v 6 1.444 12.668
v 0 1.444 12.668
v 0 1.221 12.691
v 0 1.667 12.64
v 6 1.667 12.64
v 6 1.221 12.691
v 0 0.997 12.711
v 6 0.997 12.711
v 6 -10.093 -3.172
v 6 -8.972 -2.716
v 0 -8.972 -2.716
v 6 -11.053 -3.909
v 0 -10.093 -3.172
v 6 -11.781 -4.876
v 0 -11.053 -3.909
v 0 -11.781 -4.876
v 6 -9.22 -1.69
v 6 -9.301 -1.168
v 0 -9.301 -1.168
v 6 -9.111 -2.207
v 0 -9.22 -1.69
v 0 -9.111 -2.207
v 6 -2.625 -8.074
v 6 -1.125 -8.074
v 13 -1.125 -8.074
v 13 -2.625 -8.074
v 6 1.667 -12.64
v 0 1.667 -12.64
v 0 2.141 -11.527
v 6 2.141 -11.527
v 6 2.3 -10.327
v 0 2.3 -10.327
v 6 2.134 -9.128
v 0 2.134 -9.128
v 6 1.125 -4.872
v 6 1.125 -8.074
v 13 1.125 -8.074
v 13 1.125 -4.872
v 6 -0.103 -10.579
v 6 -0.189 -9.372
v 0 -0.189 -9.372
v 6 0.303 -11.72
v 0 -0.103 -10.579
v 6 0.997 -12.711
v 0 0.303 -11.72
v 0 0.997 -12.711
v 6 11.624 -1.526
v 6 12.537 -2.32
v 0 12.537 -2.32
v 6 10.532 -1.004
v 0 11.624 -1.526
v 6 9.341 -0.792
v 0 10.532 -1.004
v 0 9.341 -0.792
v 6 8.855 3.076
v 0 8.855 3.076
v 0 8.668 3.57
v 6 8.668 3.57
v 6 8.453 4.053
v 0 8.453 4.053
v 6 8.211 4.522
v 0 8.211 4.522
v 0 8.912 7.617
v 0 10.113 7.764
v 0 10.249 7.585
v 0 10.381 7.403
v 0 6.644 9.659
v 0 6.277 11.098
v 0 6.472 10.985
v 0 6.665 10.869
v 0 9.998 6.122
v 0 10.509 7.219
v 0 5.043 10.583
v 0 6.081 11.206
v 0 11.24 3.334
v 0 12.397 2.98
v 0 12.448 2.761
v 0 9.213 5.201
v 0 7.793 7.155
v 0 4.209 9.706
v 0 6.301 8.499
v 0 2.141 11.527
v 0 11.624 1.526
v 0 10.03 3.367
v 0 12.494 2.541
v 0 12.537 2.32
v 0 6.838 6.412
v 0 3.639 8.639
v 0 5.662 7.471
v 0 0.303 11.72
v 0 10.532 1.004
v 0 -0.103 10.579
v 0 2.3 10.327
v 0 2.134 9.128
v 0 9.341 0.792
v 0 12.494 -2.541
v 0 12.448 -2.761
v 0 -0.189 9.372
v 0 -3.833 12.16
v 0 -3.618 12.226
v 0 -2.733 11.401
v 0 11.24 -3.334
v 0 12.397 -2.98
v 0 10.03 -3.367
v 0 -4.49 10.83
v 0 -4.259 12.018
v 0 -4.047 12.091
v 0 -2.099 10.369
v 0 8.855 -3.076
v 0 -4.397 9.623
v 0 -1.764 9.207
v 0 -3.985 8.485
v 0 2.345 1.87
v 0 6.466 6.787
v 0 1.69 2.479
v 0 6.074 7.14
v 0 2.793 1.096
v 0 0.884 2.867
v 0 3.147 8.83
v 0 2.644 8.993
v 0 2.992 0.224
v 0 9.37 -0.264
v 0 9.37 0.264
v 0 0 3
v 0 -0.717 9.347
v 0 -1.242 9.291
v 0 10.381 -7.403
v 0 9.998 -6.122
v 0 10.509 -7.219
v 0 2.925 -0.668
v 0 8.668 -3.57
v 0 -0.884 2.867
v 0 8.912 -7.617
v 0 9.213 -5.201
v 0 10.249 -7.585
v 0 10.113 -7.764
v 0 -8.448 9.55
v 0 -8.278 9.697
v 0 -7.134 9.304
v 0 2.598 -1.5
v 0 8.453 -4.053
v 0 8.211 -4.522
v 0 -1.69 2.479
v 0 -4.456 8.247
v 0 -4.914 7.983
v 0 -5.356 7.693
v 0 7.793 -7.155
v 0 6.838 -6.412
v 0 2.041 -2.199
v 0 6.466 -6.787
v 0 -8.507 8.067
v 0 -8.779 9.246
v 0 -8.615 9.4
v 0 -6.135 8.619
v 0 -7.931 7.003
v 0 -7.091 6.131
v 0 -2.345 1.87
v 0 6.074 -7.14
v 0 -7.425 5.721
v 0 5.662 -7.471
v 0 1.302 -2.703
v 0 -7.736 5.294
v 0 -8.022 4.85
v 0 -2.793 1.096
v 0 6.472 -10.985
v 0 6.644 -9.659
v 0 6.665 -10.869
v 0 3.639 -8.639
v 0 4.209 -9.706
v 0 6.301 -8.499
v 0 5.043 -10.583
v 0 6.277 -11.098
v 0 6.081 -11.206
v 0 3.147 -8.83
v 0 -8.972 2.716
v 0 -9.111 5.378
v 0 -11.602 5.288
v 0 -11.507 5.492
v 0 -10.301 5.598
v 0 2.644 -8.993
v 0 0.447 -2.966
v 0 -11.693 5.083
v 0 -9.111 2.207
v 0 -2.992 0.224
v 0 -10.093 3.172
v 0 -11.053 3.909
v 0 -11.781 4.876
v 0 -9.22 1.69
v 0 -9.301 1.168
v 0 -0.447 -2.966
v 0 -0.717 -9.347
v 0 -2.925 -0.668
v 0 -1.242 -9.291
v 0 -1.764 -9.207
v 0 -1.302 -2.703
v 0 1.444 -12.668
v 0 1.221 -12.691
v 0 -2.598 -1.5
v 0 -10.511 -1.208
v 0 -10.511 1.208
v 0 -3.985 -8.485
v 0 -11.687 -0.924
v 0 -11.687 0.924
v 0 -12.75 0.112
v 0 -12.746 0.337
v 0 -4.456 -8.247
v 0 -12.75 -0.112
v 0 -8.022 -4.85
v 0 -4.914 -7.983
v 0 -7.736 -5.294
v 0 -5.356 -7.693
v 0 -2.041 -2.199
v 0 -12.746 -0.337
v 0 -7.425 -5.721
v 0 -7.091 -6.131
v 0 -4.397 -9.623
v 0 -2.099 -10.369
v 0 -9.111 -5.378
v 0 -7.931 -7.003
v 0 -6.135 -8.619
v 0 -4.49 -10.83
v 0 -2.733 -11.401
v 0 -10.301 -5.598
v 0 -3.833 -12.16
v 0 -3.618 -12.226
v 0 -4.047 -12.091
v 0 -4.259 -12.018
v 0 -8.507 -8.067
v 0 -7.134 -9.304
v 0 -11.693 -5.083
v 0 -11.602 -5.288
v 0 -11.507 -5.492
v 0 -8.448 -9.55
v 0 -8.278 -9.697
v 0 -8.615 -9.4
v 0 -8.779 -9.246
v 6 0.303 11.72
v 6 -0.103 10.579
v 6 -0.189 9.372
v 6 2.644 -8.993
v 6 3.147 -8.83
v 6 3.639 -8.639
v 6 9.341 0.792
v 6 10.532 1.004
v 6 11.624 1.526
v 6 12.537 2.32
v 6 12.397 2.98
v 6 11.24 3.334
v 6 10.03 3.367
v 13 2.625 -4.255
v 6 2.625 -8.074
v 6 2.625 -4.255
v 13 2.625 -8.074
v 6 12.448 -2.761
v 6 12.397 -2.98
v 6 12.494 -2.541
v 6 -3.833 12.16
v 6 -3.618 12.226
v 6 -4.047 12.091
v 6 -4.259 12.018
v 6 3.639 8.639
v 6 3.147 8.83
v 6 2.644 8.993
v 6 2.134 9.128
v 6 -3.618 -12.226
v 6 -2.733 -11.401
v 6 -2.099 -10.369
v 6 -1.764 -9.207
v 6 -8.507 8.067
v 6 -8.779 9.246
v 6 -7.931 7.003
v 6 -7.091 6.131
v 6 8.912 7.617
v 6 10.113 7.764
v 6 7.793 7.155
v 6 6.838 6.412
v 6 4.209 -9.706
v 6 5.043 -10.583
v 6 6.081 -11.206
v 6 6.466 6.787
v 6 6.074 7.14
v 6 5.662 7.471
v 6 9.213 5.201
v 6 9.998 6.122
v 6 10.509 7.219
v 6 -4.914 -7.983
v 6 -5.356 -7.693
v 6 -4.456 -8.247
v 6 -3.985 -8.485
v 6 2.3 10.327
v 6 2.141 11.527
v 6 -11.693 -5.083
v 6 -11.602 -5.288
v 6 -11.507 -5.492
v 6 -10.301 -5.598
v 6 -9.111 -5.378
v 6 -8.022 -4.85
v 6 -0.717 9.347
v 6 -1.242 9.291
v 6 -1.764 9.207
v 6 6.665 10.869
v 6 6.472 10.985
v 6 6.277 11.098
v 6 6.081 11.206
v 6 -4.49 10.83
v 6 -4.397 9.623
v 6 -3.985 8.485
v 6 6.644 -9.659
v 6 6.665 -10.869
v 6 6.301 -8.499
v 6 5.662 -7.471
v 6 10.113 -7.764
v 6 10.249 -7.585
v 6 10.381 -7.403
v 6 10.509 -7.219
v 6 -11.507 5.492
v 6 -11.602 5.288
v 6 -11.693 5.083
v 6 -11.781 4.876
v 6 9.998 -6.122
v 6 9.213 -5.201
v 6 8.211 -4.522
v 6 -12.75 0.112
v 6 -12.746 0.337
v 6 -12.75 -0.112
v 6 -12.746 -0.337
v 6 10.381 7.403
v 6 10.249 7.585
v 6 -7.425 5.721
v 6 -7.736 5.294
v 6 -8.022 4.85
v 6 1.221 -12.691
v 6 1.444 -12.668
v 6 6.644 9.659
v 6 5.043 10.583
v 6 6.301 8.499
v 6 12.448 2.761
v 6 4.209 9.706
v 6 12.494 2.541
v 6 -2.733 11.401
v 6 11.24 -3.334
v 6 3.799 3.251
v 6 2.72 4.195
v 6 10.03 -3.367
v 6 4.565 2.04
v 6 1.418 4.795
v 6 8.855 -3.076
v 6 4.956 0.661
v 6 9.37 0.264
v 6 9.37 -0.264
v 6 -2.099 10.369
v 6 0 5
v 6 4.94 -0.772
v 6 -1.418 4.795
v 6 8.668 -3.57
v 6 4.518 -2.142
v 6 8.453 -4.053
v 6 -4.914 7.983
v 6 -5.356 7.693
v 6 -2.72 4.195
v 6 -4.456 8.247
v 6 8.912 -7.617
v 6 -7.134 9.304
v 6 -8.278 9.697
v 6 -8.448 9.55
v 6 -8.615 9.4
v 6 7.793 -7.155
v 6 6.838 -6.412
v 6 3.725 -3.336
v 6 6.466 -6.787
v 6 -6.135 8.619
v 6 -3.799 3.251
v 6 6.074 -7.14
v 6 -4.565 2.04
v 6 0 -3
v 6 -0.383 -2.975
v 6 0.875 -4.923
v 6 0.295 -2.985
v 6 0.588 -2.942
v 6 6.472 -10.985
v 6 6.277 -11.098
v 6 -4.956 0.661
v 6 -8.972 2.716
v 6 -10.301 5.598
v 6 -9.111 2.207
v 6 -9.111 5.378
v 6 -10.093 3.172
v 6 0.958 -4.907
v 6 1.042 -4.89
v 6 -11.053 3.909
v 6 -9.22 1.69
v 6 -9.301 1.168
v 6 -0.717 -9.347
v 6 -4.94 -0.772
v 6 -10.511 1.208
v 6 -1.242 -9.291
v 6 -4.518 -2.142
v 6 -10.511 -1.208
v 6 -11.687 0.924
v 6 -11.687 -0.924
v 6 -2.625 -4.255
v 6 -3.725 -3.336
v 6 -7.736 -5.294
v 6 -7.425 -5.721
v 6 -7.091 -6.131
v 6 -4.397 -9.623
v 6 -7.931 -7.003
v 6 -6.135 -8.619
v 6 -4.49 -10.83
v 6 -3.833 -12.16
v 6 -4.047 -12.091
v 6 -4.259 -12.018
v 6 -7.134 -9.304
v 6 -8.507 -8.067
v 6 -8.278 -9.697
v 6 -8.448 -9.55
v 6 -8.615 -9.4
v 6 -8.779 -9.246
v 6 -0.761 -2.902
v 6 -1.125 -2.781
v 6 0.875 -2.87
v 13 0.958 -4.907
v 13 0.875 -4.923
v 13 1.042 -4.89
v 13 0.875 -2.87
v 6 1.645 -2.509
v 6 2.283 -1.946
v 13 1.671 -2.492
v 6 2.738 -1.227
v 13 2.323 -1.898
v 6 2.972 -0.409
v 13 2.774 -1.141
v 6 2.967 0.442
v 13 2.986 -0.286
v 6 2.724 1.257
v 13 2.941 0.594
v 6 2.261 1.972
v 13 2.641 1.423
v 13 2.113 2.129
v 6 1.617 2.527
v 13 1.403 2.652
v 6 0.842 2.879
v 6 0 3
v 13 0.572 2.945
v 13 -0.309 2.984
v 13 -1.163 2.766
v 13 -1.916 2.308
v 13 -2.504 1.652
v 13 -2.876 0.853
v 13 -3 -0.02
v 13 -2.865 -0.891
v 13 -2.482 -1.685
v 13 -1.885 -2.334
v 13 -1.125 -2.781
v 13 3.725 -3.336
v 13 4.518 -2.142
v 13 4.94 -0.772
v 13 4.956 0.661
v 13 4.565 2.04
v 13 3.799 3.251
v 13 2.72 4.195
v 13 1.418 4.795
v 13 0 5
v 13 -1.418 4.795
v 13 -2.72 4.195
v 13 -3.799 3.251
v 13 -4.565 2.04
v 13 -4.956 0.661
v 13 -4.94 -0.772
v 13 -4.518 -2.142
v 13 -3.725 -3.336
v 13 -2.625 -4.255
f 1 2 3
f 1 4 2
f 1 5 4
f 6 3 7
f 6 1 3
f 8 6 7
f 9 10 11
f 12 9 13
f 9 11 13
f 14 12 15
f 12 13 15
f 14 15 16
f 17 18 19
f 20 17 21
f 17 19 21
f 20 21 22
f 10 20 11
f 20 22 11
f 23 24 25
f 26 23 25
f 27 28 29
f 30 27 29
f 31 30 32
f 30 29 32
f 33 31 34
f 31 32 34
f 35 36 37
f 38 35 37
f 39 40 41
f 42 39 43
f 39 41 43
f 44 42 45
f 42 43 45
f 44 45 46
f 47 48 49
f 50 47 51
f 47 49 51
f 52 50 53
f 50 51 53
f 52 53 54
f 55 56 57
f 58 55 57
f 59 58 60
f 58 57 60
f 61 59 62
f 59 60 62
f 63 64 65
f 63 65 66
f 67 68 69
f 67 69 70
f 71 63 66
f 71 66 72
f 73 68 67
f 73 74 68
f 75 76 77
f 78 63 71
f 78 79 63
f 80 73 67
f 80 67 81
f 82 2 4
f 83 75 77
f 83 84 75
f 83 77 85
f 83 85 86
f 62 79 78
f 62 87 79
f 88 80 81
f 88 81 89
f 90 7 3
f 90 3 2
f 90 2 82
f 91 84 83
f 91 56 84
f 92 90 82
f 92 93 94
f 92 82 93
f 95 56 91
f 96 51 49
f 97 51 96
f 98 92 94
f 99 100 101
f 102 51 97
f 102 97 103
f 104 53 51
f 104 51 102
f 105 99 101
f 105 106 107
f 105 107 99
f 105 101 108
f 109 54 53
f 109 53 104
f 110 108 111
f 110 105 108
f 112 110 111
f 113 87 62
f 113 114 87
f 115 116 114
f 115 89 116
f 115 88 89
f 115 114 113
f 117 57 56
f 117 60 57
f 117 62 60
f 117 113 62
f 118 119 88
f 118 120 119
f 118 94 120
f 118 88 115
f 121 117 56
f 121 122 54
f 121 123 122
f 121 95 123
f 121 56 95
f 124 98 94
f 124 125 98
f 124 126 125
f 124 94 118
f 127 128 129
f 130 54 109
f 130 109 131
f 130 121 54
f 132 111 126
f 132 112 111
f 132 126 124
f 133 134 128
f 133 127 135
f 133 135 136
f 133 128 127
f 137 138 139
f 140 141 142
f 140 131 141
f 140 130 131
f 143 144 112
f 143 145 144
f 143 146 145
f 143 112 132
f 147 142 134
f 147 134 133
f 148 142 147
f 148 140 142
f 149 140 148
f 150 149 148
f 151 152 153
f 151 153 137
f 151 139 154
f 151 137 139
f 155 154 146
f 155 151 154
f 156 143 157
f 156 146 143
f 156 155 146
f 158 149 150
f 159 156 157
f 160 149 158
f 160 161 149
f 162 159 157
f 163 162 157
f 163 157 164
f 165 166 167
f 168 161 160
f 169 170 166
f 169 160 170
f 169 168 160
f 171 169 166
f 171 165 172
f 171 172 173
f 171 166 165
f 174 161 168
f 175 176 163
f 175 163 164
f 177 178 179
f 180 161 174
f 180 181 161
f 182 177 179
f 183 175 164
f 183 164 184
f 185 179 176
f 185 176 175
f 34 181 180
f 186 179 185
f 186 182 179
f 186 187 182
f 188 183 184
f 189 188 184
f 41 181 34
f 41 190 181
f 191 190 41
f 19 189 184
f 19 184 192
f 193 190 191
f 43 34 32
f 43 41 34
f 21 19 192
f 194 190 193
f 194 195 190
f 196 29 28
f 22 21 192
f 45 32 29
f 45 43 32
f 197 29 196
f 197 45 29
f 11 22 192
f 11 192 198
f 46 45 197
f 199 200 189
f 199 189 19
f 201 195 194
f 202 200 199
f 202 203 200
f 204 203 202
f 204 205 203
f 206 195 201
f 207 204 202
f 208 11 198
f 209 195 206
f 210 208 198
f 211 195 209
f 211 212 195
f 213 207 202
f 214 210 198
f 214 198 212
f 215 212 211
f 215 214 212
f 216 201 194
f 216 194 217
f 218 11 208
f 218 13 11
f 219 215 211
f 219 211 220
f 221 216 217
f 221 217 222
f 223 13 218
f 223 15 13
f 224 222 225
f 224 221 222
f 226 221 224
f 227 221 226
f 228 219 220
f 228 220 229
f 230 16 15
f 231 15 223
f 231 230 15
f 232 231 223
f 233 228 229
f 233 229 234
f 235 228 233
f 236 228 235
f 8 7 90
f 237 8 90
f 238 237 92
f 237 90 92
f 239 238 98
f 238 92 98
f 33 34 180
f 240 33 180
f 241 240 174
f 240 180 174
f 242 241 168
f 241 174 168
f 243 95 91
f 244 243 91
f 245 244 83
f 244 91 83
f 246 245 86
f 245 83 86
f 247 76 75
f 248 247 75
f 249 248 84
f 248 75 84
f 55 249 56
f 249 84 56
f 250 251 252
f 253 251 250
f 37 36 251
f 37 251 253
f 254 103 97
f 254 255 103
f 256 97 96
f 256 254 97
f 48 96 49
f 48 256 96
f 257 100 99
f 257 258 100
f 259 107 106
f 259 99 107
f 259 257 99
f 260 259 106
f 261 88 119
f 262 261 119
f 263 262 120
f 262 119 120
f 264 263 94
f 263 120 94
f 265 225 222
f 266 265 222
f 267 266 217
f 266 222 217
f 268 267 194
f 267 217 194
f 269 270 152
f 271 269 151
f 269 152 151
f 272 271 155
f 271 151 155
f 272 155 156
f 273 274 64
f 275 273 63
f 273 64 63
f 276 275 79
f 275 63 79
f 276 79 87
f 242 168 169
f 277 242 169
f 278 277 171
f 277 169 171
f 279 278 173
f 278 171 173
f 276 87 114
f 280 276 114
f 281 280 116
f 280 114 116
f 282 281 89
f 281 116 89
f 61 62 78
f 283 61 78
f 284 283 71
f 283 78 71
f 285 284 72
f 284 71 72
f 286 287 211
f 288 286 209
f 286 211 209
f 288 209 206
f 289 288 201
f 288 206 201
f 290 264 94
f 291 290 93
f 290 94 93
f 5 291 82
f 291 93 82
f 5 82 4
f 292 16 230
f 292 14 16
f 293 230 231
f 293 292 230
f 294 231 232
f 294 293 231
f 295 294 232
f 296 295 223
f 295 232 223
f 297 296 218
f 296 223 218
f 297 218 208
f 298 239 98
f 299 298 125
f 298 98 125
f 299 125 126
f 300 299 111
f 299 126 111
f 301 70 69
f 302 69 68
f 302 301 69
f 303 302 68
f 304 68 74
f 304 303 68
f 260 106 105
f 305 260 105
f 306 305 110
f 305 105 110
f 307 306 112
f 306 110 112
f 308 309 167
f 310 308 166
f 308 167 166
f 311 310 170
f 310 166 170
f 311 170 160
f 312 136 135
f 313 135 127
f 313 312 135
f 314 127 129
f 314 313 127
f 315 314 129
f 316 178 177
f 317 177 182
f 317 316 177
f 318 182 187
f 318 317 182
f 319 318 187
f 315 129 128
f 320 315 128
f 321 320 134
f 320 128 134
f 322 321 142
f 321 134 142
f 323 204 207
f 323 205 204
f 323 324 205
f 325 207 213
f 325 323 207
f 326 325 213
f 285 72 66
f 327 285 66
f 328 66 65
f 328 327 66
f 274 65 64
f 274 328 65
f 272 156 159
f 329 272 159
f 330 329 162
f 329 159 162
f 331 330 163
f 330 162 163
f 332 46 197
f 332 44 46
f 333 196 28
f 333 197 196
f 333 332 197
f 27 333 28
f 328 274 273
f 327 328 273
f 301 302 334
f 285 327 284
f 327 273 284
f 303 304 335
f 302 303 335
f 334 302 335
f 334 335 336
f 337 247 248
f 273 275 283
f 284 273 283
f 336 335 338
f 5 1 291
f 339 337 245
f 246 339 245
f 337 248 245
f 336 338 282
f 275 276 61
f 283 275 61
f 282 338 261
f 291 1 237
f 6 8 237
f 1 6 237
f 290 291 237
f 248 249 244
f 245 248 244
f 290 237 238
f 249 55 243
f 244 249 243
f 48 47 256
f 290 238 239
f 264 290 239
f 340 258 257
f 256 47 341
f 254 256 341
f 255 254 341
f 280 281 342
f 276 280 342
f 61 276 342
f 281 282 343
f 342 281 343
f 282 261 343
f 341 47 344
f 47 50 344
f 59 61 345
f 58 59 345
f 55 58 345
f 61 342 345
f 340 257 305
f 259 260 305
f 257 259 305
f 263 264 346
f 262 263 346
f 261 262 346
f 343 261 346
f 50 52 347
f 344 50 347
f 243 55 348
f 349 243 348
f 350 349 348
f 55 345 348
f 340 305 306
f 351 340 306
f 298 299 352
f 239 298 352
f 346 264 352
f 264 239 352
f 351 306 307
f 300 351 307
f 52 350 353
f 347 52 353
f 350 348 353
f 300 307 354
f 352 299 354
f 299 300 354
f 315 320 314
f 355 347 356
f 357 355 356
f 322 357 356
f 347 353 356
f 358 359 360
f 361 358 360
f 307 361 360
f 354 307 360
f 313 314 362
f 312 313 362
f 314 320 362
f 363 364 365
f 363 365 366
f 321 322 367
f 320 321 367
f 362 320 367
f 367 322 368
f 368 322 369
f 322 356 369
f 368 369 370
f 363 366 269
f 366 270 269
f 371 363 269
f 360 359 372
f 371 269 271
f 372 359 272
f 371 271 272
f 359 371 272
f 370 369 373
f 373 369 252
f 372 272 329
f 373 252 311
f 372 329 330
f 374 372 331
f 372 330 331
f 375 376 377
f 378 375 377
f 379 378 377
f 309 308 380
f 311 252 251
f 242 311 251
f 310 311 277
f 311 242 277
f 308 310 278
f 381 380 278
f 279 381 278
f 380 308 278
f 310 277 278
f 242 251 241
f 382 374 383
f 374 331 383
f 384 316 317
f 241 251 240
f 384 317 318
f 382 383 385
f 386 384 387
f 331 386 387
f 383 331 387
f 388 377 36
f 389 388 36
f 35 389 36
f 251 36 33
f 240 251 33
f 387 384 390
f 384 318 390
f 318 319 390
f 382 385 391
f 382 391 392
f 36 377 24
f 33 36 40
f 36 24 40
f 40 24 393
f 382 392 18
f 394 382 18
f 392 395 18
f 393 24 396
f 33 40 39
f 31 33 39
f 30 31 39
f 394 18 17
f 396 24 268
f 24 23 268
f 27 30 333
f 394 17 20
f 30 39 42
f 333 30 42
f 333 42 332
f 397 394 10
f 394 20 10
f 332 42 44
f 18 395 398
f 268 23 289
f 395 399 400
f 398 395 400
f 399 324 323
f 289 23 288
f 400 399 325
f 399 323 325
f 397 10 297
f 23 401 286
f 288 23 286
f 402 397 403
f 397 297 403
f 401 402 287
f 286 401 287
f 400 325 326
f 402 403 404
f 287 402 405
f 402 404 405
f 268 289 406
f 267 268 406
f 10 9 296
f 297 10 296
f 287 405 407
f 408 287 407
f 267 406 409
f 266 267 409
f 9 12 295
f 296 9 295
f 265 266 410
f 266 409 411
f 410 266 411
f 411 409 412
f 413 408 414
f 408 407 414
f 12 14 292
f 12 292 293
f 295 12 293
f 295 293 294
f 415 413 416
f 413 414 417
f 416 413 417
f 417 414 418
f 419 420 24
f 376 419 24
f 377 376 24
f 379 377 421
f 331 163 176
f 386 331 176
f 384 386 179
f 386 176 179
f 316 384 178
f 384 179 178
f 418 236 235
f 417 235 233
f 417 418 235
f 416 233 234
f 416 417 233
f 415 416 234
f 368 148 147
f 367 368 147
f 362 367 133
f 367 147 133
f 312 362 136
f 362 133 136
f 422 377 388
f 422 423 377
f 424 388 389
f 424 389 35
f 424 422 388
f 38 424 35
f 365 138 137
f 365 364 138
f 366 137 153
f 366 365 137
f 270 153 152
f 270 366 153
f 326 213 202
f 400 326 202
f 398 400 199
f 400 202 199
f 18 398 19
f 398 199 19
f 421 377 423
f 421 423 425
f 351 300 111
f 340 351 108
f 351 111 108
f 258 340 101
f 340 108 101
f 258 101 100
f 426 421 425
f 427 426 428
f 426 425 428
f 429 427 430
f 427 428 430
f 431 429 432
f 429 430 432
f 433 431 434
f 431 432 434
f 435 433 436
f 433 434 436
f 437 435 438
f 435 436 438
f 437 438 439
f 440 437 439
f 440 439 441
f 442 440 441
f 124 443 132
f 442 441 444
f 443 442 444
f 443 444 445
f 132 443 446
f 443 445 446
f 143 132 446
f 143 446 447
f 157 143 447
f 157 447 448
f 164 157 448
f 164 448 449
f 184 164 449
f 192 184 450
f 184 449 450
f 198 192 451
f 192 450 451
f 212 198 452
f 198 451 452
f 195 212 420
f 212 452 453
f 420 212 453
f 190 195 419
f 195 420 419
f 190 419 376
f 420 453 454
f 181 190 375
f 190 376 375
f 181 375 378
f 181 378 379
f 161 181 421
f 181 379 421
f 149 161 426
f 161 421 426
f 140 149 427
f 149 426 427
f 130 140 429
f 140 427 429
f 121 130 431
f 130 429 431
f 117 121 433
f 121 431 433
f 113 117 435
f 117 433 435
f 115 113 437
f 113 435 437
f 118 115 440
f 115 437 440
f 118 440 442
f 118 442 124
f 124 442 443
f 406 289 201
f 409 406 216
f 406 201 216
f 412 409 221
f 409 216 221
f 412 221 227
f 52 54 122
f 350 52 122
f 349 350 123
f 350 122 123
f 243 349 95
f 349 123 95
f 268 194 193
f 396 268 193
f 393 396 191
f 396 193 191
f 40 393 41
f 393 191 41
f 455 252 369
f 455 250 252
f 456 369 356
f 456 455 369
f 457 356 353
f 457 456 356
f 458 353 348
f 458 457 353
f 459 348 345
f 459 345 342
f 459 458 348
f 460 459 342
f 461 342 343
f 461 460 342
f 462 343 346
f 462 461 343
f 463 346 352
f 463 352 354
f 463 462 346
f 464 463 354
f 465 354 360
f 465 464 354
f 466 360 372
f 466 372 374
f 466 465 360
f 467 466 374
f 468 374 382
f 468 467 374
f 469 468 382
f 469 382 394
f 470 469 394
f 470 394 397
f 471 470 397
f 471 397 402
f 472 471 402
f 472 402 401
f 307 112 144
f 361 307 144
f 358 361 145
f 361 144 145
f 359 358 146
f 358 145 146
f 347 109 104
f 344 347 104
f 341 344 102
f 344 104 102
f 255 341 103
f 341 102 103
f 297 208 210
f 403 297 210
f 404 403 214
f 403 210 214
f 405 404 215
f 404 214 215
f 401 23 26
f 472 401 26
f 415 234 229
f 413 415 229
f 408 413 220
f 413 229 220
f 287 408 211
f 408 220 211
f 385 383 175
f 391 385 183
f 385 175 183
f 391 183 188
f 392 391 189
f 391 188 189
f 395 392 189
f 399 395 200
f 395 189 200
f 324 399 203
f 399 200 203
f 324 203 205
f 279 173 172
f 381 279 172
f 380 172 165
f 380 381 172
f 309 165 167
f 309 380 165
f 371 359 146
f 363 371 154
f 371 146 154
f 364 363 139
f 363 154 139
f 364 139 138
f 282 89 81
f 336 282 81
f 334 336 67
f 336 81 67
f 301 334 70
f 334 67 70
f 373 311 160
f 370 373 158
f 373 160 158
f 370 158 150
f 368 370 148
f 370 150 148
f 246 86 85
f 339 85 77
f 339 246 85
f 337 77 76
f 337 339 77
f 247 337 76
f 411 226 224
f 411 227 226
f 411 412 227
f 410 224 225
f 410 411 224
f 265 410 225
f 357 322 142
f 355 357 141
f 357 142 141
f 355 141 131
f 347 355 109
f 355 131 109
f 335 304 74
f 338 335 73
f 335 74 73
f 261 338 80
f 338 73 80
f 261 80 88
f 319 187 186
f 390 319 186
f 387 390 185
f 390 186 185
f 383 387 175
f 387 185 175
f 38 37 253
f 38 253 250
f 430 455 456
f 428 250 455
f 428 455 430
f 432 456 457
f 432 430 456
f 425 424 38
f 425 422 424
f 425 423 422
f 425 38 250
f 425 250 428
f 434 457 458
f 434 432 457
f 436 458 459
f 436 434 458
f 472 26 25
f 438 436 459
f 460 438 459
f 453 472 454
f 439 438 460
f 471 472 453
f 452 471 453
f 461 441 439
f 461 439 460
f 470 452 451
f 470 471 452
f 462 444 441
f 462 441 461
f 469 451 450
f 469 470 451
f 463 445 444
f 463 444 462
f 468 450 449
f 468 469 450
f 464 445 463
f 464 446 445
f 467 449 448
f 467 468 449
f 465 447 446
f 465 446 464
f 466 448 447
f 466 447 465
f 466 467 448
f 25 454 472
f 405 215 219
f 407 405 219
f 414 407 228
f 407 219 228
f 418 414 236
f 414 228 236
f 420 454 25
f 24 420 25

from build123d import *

# Parameters (mm, degrees)
BASPROSKE_W         = 6
BASPROSKE_H         = 12.75
TOOTHCUT_DEPTH      = 20.003289189
TEETHCUTS_COUNT     = 15
TEETHCUTS_ANGLE     = 336
BORSKE_R            = 3
BORE_DEPTH          = 50.0000508
BOSS_EXTRUDE1_START = 7
SKETCH1_R           = 5
SKETCH1_R_2         = 3
BOSS_EXTRUDE1_DEPTH = 7
CUT_EXTRUDE1_START  = -7
CUT_EXTRUDE1_DEPTH  = 7
SKETCH3_W           = 7
SKETCH3_H           = 5.292923502
BOSS_EXTRUDE2_DEPTH = 1.5


# Read off the part's stored shape, not the designer's step: Cut-Extrude1
with BuildPart() as part:
    # BasProSke → Base-Revolve (revolve)
    with BuildSketch(Plane(origin=(0, 0, 0), x_dir=(1, 0, 0), z_dir=(0, 1, 0)), mode=Mode.PRIVATE) as base_revolve_sk:
        with Locations((3, 6.375)):
            Rectangle(BASPROSKE_W, BASPROSKE_H)
    revolve(base_revolve_sk.sketch.rotate(Axis((-10, 0, 0), (1, 0, 0)), 180), axis=Axis((-10, 0, 0), (1, 0, 0)))

    # TooCutSke → ToothCut (cut, through all)
    with BuildSketch(Plane(origin=(0, 0, 0), x_dir=(0, 0, -1), z_dir=(1, 0, 0))):
        with BuildLine():
            ThreePointArc((0.791546546, 9.340520867), (0, 9.374), (-0.791546546, 9.340520867))
            ThreePointArc((-0.791546546, 9.340520867), (-1.235070734, 11.110218102), (-2.344732916, 12.558386549))
            ThreePointArc((-2.344732916, 12.558386549), (0, 12.7754), (2.344732916, 12.558386549))
            ThreePointArc((2.344732916, 12.558386549), (1.235070734, 11.110218102), (0.791546546, 9.340520867))
        make_face()
    toothcut = extrude(amount=TOOTHCUT_DEPTH, mode=Mode.SUBTRACT)

    # TeethCuts: ToothCut ×15 about axis
    teethcuts_axis = Axis((-10, 0, 0), (1, 0, 0))
    for i in range(1, TEETHCUTS_COUNT):
        add(toothcut.rotate(teethcuts_axis, i * TEETHCUTS_ANGLE / (TEETHCUTS_COUNT - 1)), mode=Mode.SUBTRACT)

    # BorSke → Bore (cut, symmetric)
    with BuildSketch(Plane(origin=(0, 0, 0), x_dir=(0, 0, -1), z_dir=(1, 0, 0))):
        with Locations(Location((0, 0, 0), (0, 0, 180))):
            Circle(BORSKE_R)
    extrude(amount=BORE_DEPTH, both=True, mode=Mode.SUBTRACT)

    # Sketch1 → Boss-Extrude1 (add)
    with BuildSketch(Plane(origin=(6, 0, 0), x_dir=(0, 0, -1), z_dir=(1, 0, 0)).offset(BOSS_EXTRUDE1_START)):
        with Locations(Location((0, 0, 0), (0, 0, 180))):
            Circle(SKETCH1_R)
        Circle(SKETCH1_R_2, mode=Mode.SUBTRACT)
    extrude(amount=-BOSS_EXTRUDE1_DEPTH)

    # Cut-Extrude1 outline → Cut-Extrude1 (cut)
    with BuildSketch(Plane(origin=(13, 0, 0), x_dir=(0, 0, -1), z_dir=(1, 0, 0)).offset(CUT_EXTRUDE1_START)):
        with BuildLine():
            ThreePointArc((2.869678463, 0.874611639), (2.997049903, -0.133010816), (2.780917301, -1.125388361))
            Line((2.780917301, -1.125388361), (4.87170412, -1.125388361))
            ThreePointArc((4.87170412, -1.125388361), (4.998361954, -0.127975708), (4.922911179, 0.874611639))
            Line((4.922911179, 0.874611639), (2.869678463, 0.874611639))
        make_face()
    extrude(amount=CUT_EXTRUDE1_DEPTH, mode=Mode.SUBTRACT)

    # Sketch3 → Boss-Extrude2 (add)
    with BuildSketch(Plane(origin=(0, -1.125388361, 0), x_dir=(1, 0, 0), z_dir=(0, 1, 0))):
        with Locations((9.5, 5.427379052)):
            Rectangle(SKETCH3_W, SKETCH3_H)
    boss_extrude2 = extrude(amount=-BOSS_EXTRUDE2_DEPTH)

    # Mirror2: Boss-Extrude2 across plane
    add(boss_extrude2.mirror(Plane.ZX))


solid = part.part
